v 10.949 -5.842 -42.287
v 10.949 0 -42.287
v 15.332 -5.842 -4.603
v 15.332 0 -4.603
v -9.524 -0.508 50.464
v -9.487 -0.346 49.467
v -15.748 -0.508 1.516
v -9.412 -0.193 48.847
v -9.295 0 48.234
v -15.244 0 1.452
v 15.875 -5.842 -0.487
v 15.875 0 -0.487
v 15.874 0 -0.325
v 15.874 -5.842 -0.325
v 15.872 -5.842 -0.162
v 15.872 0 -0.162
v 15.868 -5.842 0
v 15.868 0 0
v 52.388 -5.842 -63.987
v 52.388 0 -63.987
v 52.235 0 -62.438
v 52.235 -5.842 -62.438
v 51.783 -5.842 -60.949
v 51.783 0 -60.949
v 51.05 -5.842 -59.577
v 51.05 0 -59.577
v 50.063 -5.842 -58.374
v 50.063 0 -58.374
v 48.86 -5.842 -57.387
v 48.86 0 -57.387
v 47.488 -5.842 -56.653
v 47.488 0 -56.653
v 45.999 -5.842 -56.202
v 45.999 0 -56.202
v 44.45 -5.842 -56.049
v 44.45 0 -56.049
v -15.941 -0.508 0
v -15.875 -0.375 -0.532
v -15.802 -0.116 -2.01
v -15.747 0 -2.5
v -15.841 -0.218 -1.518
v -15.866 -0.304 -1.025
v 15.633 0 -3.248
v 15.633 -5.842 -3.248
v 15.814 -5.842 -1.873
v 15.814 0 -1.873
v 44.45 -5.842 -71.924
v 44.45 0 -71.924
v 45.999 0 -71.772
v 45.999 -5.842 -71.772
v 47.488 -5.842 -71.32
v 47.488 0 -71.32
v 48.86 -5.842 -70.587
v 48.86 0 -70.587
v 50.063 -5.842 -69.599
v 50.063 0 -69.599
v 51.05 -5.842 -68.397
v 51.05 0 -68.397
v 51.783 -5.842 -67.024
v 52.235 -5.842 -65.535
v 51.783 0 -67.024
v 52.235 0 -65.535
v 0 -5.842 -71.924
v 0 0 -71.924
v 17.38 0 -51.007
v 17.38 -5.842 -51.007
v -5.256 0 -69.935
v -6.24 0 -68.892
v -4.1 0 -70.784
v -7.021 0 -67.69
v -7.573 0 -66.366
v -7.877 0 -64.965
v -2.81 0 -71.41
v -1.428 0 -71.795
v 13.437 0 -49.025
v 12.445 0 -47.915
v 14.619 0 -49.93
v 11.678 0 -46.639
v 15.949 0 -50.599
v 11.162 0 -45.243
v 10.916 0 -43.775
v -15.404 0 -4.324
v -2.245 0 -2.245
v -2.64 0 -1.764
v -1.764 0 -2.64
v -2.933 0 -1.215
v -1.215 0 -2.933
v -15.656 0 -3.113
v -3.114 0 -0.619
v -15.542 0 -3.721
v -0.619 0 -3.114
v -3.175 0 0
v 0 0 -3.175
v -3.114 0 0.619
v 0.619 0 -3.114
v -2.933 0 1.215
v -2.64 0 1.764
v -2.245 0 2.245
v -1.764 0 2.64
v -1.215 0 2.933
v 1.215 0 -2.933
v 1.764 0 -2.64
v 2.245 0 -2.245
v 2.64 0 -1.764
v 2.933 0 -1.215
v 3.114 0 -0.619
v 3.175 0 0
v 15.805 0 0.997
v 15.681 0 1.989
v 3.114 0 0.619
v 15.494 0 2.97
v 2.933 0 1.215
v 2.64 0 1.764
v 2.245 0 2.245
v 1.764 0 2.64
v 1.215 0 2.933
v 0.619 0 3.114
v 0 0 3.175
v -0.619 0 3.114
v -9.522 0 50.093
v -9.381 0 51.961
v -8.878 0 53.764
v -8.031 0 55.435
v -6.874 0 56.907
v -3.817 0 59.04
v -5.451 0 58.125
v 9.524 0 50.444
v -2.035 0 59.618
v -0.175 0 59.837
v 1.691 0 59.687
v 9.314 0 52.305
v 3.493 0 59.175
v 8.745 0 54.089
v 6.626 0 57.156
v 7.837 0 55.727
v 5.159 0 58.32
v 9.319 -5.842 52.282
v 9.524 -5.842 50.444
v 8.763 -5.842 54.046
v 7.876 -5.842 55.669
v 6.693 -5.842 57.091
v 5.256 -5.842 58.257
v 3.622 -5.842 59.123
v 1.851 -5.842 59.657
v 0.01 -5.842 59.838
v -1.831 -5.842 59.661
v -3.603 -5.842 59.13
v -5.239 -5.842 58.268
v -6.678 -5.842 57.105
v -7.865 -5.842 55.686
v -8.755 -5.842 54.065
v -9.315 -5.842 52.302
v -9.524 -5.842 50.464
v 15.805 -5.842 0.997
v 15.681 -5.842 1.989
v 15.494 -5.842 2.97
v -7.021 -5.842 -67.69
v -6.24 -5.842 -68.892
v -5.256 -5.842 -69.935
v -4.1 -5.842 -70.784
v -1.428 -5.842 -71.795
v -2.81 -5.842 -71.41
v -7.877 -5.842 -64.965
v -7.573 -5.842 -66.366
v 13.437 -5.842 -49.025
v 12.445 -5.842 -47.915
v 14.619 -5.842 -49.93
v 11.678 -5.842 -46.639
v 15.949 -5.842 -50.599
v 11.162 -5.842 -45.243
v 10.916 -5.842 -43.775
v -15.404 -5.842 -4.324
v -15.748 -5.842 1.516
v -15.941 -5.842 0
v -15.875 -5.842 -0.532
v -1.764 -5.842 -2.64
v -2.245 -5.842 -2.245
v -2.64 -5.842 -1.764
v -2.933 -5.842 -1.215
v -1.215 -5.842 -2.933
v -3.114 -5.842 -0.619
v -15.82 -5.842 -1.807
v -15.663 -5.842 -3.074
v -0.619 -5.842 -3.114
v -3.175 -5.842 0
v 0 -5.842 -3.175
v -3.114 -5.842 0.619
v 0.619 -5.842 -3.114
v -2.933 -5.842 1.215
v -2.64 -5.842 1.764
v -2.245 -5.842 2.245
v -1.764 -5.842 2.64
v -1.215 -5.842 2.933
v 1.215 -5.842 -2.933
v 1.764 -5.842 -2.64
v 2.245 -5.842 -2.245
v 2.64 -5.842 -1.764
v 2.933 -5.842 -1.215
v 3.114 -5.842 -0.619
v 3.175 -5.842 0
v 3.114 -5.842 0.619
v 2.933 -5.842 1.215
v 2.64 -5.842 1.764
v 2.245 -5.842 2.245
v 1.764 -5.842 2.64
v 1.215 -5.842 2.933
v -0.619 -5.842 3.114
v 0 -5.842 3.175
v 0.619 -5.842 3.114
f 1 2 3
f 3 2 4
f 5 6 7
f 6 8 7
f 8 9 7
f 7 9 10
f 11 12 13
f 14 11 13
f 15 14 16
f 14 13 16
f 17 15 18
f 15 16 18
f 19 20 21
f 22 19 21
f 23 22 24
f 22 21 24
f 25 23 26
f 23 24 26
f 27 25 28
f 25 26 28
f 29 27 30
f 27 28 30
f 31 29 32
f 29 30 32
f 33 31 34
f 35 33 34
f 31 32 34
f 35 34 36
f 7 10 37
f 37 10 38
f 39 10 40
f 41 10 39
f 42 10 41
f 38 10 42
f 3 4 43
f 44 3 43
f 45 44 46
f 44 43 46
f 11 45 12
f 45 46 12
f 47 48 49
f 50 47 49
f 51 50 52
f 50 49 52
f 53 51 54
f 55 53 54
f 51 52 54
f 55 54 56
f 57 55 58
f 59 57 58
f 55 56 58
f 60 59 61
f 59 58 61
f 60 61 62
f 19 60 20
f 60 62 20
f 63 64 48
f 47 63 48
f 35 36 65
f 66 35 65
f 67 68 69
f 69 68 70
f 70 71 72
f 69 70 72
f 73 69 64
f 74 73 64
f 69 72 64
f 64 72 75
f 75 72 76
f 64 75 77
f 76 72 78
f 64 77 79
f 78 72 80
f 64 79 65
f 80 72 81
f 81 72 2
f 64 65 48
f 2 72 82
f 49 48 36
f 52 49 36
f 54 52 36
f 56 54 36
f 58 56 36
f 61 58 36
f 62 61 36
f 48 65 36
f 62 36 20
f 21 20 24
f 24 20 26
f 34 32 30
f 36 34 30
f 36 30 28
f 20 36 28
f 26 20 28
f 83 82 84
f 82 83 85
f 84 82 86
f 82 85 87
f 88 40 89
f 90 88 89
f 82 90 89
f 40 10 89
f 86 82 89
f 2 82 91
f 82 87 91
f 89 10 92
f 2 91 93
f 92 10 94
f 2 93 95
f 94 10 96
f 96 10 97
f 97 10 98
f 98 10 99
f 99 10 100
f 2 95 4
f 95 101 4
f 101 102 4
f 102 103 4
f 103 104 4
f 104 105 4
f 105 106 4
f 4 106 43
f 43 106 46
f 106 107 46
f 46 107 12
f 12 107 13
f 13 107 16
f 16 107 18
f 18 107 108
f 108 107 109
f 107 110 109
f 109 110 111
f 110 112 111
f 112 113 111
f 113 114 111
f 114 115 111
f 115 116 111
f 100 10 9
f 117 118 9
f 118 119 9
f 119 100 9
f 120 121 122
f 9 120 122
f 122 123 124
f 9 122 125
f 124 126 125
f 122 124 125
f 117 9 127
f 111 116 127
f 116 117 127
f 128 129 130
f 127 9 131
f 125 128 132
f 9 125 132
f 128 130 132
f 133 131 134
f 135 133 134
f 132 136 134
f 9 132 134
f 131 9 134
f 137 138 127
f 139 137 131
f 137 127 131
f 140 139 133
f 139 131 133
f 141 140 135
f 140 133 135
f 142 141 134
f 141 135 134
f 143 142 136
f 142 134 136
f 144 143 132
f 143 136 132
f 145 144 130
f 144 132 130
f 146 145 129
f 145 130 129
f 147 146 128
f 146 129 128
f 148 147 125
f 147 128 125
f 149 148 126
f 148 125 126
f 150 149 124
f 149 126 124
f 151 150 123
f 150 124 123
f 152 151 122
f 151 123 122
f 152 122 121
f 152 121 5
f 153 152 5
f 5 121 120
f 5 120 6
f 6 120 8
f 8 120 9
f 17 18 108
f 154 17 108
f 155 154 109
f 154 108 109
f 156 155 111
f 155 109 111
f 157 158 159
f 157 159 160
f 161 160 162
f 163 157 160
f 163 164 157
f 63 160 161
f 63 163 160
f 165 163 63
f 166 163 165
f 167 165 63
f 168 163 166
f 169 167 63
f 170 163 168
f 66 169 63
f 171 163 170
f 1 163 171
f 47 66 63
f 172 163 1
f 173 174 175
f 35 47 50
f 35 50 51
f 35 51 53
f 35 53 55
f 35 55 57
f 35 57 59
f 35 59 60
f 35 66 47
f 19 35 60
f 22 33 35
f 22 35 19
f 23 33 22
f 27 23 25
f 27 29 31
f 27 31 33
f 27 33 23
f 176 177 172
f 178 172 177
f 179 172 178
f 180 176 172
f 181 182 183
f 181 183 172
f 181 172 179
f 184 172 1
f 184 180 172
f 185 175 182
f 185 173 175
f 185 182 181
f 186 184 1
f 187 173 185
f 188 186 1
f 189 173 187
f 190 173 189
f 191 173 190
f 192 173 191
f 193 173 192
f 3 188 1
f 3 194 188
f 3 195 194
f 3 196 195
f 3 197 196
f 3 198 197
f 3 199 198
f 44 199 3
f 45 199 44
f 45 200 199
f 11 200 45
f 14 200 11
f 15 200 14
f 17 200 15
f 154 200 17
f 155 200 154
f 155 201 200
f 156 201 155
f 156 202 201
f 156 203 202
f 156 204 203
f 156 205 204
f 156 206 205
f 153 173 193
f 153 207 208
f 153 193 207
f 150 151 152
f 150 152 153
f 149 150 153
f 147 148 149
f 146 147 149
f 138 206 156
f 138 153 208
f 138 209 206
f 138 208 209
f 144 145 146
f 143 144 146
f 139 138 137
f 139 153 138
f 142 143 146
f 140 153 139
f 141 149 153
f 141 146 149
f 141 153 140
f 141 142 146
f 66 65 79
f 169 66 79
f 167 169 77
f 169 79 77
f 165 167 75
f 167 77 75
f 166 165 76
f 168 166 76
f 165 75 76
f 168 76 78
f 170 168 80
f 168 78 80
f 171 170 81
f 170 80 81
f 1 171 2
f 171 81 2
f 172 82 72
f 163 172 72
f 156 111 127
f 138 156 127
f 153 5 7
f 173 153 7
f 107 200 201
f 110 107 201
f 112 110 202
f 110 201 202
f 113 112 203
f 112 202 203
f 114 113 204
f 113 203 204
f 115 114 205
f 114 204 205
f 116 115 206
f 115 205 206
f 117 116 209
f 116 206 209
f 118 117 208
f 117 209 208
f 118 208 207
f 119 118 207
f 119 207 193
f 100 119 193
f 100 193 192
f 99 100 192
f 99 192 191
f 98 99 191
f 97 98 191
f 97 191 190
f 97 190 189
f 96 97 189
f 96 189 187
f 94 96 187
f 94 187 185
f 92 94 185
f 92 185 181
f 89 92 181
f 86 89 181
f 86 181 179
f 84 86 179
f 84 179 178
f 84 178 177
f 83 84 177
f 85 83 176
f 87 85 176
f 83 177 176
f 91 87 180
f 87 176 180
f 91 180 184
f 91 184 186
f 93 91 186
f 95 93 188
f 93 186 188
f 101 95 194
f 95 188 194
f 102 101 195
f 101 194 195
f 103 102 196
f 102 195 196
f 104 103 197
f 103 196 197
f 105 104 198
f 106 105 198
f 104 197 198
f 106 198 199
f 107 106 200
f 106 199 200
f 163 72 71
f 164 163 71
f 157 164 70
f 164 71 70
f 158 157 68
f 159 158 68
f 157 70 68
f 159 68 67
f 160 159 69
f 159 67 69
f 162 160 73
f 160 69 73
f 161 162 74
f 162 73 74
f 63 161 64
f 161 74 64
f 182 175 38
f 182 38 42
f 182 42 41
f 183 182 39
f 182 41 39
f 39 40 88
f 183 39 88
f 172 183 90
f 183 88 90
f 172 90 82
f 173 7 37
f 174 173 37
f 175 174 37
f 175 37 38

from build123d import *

# Parameters (mm, degrees)
F1_DEPTH = 5.842
F3_D     = 6.35
F4_SIZE  = 0.508


with BuildPart() as f1:
    # F0 (on Front) → F1 (new body)
    with BuildSketch(Plane.XZ):
        with BuildLine():
            ThreePointArc((-9.5238039492, 50.4641557941), (-0.0754731213, 40.7885133075), (9.525, 50.3132142901))
            ThreePointArc((9.525, 50.3132142901), (9.5247764361, 50.3784740944), (9.524105755, 50.4437308352))
            ThreePointArc((9.524105755, 50.4437308352), (0.0102135943, 59.8382088142), (-9.5238039492, 50.4641557941))
        make_face()
        with BuildLine():
            ThreePointArc((9.524105755, 50.4437308352), (9.5247764361, 50.3784740944), (9.525, 50.3132142901))
            ThreePointArc((9.525, 50.3132142901), (-0.0754731213, 40.7885133075), (-9.5238039492, 50.4641557941))
            Line((-9.5238039492, 50.4641557941), (-15.7481848278, 1.515787542))
            ThreePointArc((-15.7481848278, 1.515787542), (-0.7382390734, 15.3710397423), (15.4940214613, 2.9702251313))
            Line((15.4940214613, 2.9702251313), (9.524105755, 50.4437308352))
        make_face()
        with BuildLine():
            Line((15.8675349274, 0), (15.4940214613, 2.9702251313))
            ThreePointArc((15.4940214613, 2.9702251313), (-0.7382390734, 15.3710397423), (-15.7481848278, 1.515787542))
            ThreePointArc((-15.7481848278, 1.515787542), (-15.8446680698, 0.4940908149), (-15.8749364489, -0.5317049948))
            Line((-15.8749364489, -0.5317049948), (-15.404151012, -4.3244616471))
            ThreePointArc((-15.404151012, -4.3244616471), (-0.1436036046, -16.3611361849), (15.332202426, -4.602510891))
            Line((15.332202426, -4.602510891), (15.8675349274, 0))
        make_face()
        with BuildLine():
            ThreePointArc((15.8675349274, 0), (15.7509480386, 1.4939366044), (15.4940214613, 2.9702251313))
            Line((15.4940214613, 2.9702251313), (15.8675349274, 0))
        make_face()
        with BuildLine():
            ThreePointArc((-15.8749364489, -0.5317049948), (-15.8446680698, 0.4940908149), (-15.7481848278, 1.515787542))
            Line((-15.7481848278, 1.515787542), (-15.9409356657, 0))
            Line((-15.9409356657, 0), (-15.8749364489, -0.5317049948))
        make_face()
        with BuildLine():
            ThreePointArc((15.875, -0.4867857099), (15.8731336221, -0.2433642366), (15.8675349274, 0))
            Line((15.8675349274, 0), (15.332202426, -4.602510891))
            ThreePointArc((15.332202426, -4.602510891), (15.7387156165, -2.5624677046), (15.875, -0.4867857099))
        make_face()
        with BuildLine():
            Line((-15.404151012, -4.3244616471), (-15.8749364489, -0.5317049948))
            ThreePointArc((-15.8749364489, -0.5317049948), (-15.7540972084, -2.4423025589), (-15.404151012, -4.3244616471))
        make_face()
        with BuildLine():
            Line((10.9490243725, -42.2867999584), (15.332202426, -4.602510891))
            ThreePointArc((15.332202426, -4.602510891), (-0.1436036046, -16.3611361849), (-15.404151012, -4.3244616471))
            Line((-15.404151012, -4.3244616471), (-7.8770486042, -64.9645441344))
            ThreePointArc((-7.8770486042, -64.9645441344), (-0.4898126958, -56.0644129735), (7.9375, -63.9867857099))
            ThreePointArc((7.9375, -63.9867857099), (5.6126600757, -69.5994457855), (0, -71.9242857099))
            Line((0, -71.9242857099), (44.45, -71.9242857099))
            ThreePointArc((44.45, -71.9242857099), (36.5125, -63.9867857099), (44.45, -56.0492857099))
            Line((44.45, -56.0492857099), (17.3799107009, -51.0071446685))
            ThreePointArc((17.3799107009, -51.0071446685), (12.4451190536, -47.9149192836), (10.9490243725, -42.2867999584))
        make_face()
        with BuildLine():
            ThreePointArc((7.9375, -63.9867857099), (-0.4898126958, -56.0644129735), (-7.8770486042, -64.9645441344))
            ThreePointArc((-7.8770486042, -64.9645441344), (-5.2556136062, -69.9350990735), (0, -71.9242857099))
            ThreePointArc((0, -71.9242857099), (5.6126600757, -69.5994457855), (7.9375, -63.9867857099))
        make_face()
        with BuildLine():
            ThreePointArc((52.3875, -63.9867857099), (50.0626600757, -58.3741256342), (44.45, -56.0492857099))
            ThreePointArc((44.45, -56.0492857099), (36.5125, -63.9867857099), (44.45, -71.9242857099))
            ThreePointArc((44.45, -71.9242857099), (50.0626600757, -69.5994457855), (52.3875, -63.9867857099))
        make_face()
    extrude(amount=F1_DEPTH)

    # F3 (through all)
    with Locations(Plane(origin=(0, 0, 0), x_dir=(-1, 0, 0), z_dir=(0, 1, 0))):
        with Locations((0, 0)):
            Hole(F3_D / 2)

    # F4
    f4_edges = [f1.edges().sort_by_distance(p)[0] for p in [
        (-12.73237, 0, 25.232078),
    ]]
    chamfer(f4_edges, length=F4_SIZE)


solid = f1.part
